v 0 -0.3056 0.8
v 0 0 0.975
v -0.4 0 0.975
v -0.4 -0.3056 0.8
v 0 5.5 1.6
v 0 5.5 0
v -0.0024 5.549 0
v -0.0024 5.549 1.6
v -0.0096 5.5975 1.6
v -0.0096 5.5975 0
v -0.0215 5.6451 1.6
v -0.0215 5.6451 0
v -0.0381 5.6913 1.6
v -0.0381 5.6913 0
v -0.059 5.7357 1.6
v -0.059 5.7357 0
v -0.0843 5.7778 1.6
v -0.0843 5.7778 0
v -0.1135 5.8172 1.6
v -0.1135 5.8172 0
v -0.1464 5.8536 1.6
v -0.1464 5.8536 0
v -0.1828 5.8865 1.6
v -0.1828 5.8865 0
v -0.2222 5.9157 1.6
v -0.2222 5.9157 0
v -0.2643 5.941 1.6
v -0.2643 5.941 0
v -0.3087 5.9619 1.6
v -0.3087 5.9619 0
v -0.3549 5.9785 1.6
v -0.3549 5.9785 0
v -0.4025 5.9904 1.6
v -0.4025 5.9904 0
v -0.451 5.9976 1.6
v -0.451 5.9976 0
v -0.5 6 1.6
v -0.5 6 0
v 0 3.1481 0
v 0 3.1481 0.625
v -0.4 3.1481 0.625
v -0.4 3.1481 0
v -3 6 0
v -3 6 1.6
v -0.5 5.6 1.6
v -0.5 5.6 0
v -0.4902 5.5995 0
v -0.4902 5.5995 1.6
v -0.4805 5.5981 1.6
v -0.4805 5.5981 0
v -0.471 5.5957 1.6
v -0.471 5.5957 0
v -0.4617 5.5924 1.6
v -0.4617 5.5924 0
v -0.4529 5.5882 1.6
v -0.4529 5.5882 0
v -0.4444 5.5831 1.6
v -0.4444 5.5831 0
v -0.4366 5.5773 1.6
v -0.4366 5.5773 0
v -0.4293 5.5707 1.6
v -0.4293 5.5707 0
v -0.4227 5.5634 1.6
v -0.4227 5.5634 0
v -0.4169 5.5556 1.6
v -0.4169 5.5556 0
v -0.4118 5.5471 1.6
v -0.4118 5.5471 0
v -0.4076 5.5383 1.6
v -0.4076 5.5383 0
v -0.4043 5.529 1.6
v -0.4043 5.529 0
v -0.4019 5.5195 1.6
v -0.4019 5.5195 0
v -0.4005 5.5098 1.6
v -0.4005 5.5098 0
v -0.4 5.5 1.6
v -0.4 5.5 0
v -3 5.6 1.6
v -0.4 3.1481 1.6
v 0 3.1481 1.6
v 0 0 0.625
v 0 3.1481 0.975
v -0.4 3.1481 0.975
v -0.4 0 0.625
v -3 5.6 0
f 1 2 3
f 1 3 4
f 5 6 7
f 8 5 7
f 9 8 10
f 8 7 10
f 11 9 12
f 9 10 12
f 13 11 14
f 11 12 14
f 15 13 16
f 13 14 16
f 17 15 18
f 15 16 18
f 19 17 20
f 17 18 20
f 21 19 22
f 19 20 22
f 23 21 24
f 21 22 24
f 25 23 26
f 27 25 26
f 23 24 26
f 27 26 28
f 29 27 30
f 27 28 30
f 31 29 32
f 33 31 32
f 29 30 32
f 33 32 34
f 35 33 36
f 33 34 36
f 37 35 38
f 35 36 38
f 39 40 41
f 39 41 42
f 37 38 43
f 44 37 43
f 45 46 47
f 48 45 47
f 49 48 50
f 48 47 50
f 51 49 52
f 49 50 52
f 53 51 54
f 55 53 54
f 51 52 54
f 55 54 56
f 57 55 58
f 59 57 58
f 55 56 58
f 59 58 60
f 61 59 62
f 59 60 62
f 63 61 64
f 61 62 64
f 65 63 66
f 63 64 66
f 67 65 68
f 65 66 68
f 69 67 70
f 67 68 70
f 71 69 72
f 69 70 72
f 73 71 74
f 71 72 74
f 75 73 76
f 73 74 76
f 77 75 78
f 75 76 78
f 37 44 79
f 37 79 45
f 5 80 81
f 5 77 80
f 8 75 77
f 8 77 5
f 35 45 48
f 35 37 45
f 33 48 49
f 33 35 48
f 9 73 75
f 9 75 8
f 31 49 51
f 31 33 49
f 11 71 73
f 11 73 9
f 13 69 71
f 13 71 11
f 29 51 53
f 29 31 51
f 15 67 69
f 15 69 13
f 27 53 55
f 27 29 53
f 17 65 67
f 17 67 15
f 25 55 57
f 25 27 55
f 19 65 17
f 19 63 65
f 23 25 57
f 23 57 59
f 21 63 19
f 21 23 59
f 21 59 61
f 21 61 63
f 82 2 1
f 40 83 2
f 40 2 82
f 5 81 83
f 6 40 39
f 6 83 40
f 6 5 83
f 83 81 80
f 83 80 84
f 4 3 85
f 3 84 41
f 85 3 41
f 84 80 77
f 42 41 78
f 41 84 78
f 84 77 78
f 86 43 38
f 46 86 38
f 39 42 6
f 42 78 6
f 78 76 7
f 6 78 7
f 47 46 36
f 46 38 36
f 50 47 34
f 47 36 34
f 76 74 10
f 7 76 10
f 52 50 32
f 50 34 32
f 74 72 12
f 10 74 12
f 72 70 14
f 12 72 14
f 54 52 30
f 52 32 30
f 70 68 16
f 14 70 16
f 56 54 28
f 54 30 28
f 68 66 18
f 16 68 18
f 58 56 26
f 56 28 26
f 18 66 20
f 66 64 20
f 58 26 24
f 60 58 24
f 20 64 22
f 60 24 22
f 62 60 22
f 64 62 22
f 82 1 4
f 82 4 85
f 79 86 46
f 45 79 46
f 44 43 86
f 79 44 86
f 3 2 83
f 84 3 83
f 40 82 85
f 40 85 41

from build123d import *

# Parameters (mm, degrees)
BOSS_EXTRUDE1_DEPTH = 1.6
SKETCH2_W           = 0.625
SKETCH2_H           = 3.5
CUT_EXTRUDE1_DEPTH  = 1.6
BOSS_EXTRUDE2_DEPTH = 0.4


with BuildPart() as part:
    # Sketch1 → Boss-Extrude1 (new body)
    with BuildSketch(Plane.XY):
        with BuildLine():
            Line((0, 0), (0, 5.5))
            ThreePointArc((0, 5.5), (-0.146446609, 5.853553391), (-0.5, 6))
            Line((-0.5, 6), (-3, 6))
            Line((-3, 6), (-3, 5.6))
            Line((-3, 5.6), (-0.5, 5.6))
            ThreePointArc((-0.5, 5.6), (-0.429289322, 5.570710678), (-0.4, 5.5))
            Line((-0.4, 5.5), (-0.4, 0))
            Line((-0.4, 0), (0, 0))
        make_face()
    extrude(amount=BOSS_EXTRUDE1_DEPTH)

    # Sketch2 → Cut-Extrude1 (cut)
    with BuildSketch(Plane(origin=(0, 0, 0), x_dir=(0, 0, -1), z_dir=(1, 0, 0))):
        with Locations((-1.2875, 1.398103513)):
            Rectangle(SKETCH2_W, SKETCH2_H)
        with Locations((-0.3125, 1.398103513)):
            Rectangle(SKETCH2_W, SKETCH2_H)
    extrude(amount=-CUT_EXTRUDE1_DEPTH, mode=Mode.SUBTRACT)

    # Sketch3 → Boss-Extrude2 (add)
    with BuildSketch(Plane(origin=(0, 0, 0), x_dir=(0, 0, -1), z_dir=(1, 0, 0))):
        Polygon((-0.975, 0), (-0.8, -0.305627674), (-0.625, 0), align=None)
    extrude(amount=-BOSS_EXTRUDE2_DEPTH)


solid = part.part
